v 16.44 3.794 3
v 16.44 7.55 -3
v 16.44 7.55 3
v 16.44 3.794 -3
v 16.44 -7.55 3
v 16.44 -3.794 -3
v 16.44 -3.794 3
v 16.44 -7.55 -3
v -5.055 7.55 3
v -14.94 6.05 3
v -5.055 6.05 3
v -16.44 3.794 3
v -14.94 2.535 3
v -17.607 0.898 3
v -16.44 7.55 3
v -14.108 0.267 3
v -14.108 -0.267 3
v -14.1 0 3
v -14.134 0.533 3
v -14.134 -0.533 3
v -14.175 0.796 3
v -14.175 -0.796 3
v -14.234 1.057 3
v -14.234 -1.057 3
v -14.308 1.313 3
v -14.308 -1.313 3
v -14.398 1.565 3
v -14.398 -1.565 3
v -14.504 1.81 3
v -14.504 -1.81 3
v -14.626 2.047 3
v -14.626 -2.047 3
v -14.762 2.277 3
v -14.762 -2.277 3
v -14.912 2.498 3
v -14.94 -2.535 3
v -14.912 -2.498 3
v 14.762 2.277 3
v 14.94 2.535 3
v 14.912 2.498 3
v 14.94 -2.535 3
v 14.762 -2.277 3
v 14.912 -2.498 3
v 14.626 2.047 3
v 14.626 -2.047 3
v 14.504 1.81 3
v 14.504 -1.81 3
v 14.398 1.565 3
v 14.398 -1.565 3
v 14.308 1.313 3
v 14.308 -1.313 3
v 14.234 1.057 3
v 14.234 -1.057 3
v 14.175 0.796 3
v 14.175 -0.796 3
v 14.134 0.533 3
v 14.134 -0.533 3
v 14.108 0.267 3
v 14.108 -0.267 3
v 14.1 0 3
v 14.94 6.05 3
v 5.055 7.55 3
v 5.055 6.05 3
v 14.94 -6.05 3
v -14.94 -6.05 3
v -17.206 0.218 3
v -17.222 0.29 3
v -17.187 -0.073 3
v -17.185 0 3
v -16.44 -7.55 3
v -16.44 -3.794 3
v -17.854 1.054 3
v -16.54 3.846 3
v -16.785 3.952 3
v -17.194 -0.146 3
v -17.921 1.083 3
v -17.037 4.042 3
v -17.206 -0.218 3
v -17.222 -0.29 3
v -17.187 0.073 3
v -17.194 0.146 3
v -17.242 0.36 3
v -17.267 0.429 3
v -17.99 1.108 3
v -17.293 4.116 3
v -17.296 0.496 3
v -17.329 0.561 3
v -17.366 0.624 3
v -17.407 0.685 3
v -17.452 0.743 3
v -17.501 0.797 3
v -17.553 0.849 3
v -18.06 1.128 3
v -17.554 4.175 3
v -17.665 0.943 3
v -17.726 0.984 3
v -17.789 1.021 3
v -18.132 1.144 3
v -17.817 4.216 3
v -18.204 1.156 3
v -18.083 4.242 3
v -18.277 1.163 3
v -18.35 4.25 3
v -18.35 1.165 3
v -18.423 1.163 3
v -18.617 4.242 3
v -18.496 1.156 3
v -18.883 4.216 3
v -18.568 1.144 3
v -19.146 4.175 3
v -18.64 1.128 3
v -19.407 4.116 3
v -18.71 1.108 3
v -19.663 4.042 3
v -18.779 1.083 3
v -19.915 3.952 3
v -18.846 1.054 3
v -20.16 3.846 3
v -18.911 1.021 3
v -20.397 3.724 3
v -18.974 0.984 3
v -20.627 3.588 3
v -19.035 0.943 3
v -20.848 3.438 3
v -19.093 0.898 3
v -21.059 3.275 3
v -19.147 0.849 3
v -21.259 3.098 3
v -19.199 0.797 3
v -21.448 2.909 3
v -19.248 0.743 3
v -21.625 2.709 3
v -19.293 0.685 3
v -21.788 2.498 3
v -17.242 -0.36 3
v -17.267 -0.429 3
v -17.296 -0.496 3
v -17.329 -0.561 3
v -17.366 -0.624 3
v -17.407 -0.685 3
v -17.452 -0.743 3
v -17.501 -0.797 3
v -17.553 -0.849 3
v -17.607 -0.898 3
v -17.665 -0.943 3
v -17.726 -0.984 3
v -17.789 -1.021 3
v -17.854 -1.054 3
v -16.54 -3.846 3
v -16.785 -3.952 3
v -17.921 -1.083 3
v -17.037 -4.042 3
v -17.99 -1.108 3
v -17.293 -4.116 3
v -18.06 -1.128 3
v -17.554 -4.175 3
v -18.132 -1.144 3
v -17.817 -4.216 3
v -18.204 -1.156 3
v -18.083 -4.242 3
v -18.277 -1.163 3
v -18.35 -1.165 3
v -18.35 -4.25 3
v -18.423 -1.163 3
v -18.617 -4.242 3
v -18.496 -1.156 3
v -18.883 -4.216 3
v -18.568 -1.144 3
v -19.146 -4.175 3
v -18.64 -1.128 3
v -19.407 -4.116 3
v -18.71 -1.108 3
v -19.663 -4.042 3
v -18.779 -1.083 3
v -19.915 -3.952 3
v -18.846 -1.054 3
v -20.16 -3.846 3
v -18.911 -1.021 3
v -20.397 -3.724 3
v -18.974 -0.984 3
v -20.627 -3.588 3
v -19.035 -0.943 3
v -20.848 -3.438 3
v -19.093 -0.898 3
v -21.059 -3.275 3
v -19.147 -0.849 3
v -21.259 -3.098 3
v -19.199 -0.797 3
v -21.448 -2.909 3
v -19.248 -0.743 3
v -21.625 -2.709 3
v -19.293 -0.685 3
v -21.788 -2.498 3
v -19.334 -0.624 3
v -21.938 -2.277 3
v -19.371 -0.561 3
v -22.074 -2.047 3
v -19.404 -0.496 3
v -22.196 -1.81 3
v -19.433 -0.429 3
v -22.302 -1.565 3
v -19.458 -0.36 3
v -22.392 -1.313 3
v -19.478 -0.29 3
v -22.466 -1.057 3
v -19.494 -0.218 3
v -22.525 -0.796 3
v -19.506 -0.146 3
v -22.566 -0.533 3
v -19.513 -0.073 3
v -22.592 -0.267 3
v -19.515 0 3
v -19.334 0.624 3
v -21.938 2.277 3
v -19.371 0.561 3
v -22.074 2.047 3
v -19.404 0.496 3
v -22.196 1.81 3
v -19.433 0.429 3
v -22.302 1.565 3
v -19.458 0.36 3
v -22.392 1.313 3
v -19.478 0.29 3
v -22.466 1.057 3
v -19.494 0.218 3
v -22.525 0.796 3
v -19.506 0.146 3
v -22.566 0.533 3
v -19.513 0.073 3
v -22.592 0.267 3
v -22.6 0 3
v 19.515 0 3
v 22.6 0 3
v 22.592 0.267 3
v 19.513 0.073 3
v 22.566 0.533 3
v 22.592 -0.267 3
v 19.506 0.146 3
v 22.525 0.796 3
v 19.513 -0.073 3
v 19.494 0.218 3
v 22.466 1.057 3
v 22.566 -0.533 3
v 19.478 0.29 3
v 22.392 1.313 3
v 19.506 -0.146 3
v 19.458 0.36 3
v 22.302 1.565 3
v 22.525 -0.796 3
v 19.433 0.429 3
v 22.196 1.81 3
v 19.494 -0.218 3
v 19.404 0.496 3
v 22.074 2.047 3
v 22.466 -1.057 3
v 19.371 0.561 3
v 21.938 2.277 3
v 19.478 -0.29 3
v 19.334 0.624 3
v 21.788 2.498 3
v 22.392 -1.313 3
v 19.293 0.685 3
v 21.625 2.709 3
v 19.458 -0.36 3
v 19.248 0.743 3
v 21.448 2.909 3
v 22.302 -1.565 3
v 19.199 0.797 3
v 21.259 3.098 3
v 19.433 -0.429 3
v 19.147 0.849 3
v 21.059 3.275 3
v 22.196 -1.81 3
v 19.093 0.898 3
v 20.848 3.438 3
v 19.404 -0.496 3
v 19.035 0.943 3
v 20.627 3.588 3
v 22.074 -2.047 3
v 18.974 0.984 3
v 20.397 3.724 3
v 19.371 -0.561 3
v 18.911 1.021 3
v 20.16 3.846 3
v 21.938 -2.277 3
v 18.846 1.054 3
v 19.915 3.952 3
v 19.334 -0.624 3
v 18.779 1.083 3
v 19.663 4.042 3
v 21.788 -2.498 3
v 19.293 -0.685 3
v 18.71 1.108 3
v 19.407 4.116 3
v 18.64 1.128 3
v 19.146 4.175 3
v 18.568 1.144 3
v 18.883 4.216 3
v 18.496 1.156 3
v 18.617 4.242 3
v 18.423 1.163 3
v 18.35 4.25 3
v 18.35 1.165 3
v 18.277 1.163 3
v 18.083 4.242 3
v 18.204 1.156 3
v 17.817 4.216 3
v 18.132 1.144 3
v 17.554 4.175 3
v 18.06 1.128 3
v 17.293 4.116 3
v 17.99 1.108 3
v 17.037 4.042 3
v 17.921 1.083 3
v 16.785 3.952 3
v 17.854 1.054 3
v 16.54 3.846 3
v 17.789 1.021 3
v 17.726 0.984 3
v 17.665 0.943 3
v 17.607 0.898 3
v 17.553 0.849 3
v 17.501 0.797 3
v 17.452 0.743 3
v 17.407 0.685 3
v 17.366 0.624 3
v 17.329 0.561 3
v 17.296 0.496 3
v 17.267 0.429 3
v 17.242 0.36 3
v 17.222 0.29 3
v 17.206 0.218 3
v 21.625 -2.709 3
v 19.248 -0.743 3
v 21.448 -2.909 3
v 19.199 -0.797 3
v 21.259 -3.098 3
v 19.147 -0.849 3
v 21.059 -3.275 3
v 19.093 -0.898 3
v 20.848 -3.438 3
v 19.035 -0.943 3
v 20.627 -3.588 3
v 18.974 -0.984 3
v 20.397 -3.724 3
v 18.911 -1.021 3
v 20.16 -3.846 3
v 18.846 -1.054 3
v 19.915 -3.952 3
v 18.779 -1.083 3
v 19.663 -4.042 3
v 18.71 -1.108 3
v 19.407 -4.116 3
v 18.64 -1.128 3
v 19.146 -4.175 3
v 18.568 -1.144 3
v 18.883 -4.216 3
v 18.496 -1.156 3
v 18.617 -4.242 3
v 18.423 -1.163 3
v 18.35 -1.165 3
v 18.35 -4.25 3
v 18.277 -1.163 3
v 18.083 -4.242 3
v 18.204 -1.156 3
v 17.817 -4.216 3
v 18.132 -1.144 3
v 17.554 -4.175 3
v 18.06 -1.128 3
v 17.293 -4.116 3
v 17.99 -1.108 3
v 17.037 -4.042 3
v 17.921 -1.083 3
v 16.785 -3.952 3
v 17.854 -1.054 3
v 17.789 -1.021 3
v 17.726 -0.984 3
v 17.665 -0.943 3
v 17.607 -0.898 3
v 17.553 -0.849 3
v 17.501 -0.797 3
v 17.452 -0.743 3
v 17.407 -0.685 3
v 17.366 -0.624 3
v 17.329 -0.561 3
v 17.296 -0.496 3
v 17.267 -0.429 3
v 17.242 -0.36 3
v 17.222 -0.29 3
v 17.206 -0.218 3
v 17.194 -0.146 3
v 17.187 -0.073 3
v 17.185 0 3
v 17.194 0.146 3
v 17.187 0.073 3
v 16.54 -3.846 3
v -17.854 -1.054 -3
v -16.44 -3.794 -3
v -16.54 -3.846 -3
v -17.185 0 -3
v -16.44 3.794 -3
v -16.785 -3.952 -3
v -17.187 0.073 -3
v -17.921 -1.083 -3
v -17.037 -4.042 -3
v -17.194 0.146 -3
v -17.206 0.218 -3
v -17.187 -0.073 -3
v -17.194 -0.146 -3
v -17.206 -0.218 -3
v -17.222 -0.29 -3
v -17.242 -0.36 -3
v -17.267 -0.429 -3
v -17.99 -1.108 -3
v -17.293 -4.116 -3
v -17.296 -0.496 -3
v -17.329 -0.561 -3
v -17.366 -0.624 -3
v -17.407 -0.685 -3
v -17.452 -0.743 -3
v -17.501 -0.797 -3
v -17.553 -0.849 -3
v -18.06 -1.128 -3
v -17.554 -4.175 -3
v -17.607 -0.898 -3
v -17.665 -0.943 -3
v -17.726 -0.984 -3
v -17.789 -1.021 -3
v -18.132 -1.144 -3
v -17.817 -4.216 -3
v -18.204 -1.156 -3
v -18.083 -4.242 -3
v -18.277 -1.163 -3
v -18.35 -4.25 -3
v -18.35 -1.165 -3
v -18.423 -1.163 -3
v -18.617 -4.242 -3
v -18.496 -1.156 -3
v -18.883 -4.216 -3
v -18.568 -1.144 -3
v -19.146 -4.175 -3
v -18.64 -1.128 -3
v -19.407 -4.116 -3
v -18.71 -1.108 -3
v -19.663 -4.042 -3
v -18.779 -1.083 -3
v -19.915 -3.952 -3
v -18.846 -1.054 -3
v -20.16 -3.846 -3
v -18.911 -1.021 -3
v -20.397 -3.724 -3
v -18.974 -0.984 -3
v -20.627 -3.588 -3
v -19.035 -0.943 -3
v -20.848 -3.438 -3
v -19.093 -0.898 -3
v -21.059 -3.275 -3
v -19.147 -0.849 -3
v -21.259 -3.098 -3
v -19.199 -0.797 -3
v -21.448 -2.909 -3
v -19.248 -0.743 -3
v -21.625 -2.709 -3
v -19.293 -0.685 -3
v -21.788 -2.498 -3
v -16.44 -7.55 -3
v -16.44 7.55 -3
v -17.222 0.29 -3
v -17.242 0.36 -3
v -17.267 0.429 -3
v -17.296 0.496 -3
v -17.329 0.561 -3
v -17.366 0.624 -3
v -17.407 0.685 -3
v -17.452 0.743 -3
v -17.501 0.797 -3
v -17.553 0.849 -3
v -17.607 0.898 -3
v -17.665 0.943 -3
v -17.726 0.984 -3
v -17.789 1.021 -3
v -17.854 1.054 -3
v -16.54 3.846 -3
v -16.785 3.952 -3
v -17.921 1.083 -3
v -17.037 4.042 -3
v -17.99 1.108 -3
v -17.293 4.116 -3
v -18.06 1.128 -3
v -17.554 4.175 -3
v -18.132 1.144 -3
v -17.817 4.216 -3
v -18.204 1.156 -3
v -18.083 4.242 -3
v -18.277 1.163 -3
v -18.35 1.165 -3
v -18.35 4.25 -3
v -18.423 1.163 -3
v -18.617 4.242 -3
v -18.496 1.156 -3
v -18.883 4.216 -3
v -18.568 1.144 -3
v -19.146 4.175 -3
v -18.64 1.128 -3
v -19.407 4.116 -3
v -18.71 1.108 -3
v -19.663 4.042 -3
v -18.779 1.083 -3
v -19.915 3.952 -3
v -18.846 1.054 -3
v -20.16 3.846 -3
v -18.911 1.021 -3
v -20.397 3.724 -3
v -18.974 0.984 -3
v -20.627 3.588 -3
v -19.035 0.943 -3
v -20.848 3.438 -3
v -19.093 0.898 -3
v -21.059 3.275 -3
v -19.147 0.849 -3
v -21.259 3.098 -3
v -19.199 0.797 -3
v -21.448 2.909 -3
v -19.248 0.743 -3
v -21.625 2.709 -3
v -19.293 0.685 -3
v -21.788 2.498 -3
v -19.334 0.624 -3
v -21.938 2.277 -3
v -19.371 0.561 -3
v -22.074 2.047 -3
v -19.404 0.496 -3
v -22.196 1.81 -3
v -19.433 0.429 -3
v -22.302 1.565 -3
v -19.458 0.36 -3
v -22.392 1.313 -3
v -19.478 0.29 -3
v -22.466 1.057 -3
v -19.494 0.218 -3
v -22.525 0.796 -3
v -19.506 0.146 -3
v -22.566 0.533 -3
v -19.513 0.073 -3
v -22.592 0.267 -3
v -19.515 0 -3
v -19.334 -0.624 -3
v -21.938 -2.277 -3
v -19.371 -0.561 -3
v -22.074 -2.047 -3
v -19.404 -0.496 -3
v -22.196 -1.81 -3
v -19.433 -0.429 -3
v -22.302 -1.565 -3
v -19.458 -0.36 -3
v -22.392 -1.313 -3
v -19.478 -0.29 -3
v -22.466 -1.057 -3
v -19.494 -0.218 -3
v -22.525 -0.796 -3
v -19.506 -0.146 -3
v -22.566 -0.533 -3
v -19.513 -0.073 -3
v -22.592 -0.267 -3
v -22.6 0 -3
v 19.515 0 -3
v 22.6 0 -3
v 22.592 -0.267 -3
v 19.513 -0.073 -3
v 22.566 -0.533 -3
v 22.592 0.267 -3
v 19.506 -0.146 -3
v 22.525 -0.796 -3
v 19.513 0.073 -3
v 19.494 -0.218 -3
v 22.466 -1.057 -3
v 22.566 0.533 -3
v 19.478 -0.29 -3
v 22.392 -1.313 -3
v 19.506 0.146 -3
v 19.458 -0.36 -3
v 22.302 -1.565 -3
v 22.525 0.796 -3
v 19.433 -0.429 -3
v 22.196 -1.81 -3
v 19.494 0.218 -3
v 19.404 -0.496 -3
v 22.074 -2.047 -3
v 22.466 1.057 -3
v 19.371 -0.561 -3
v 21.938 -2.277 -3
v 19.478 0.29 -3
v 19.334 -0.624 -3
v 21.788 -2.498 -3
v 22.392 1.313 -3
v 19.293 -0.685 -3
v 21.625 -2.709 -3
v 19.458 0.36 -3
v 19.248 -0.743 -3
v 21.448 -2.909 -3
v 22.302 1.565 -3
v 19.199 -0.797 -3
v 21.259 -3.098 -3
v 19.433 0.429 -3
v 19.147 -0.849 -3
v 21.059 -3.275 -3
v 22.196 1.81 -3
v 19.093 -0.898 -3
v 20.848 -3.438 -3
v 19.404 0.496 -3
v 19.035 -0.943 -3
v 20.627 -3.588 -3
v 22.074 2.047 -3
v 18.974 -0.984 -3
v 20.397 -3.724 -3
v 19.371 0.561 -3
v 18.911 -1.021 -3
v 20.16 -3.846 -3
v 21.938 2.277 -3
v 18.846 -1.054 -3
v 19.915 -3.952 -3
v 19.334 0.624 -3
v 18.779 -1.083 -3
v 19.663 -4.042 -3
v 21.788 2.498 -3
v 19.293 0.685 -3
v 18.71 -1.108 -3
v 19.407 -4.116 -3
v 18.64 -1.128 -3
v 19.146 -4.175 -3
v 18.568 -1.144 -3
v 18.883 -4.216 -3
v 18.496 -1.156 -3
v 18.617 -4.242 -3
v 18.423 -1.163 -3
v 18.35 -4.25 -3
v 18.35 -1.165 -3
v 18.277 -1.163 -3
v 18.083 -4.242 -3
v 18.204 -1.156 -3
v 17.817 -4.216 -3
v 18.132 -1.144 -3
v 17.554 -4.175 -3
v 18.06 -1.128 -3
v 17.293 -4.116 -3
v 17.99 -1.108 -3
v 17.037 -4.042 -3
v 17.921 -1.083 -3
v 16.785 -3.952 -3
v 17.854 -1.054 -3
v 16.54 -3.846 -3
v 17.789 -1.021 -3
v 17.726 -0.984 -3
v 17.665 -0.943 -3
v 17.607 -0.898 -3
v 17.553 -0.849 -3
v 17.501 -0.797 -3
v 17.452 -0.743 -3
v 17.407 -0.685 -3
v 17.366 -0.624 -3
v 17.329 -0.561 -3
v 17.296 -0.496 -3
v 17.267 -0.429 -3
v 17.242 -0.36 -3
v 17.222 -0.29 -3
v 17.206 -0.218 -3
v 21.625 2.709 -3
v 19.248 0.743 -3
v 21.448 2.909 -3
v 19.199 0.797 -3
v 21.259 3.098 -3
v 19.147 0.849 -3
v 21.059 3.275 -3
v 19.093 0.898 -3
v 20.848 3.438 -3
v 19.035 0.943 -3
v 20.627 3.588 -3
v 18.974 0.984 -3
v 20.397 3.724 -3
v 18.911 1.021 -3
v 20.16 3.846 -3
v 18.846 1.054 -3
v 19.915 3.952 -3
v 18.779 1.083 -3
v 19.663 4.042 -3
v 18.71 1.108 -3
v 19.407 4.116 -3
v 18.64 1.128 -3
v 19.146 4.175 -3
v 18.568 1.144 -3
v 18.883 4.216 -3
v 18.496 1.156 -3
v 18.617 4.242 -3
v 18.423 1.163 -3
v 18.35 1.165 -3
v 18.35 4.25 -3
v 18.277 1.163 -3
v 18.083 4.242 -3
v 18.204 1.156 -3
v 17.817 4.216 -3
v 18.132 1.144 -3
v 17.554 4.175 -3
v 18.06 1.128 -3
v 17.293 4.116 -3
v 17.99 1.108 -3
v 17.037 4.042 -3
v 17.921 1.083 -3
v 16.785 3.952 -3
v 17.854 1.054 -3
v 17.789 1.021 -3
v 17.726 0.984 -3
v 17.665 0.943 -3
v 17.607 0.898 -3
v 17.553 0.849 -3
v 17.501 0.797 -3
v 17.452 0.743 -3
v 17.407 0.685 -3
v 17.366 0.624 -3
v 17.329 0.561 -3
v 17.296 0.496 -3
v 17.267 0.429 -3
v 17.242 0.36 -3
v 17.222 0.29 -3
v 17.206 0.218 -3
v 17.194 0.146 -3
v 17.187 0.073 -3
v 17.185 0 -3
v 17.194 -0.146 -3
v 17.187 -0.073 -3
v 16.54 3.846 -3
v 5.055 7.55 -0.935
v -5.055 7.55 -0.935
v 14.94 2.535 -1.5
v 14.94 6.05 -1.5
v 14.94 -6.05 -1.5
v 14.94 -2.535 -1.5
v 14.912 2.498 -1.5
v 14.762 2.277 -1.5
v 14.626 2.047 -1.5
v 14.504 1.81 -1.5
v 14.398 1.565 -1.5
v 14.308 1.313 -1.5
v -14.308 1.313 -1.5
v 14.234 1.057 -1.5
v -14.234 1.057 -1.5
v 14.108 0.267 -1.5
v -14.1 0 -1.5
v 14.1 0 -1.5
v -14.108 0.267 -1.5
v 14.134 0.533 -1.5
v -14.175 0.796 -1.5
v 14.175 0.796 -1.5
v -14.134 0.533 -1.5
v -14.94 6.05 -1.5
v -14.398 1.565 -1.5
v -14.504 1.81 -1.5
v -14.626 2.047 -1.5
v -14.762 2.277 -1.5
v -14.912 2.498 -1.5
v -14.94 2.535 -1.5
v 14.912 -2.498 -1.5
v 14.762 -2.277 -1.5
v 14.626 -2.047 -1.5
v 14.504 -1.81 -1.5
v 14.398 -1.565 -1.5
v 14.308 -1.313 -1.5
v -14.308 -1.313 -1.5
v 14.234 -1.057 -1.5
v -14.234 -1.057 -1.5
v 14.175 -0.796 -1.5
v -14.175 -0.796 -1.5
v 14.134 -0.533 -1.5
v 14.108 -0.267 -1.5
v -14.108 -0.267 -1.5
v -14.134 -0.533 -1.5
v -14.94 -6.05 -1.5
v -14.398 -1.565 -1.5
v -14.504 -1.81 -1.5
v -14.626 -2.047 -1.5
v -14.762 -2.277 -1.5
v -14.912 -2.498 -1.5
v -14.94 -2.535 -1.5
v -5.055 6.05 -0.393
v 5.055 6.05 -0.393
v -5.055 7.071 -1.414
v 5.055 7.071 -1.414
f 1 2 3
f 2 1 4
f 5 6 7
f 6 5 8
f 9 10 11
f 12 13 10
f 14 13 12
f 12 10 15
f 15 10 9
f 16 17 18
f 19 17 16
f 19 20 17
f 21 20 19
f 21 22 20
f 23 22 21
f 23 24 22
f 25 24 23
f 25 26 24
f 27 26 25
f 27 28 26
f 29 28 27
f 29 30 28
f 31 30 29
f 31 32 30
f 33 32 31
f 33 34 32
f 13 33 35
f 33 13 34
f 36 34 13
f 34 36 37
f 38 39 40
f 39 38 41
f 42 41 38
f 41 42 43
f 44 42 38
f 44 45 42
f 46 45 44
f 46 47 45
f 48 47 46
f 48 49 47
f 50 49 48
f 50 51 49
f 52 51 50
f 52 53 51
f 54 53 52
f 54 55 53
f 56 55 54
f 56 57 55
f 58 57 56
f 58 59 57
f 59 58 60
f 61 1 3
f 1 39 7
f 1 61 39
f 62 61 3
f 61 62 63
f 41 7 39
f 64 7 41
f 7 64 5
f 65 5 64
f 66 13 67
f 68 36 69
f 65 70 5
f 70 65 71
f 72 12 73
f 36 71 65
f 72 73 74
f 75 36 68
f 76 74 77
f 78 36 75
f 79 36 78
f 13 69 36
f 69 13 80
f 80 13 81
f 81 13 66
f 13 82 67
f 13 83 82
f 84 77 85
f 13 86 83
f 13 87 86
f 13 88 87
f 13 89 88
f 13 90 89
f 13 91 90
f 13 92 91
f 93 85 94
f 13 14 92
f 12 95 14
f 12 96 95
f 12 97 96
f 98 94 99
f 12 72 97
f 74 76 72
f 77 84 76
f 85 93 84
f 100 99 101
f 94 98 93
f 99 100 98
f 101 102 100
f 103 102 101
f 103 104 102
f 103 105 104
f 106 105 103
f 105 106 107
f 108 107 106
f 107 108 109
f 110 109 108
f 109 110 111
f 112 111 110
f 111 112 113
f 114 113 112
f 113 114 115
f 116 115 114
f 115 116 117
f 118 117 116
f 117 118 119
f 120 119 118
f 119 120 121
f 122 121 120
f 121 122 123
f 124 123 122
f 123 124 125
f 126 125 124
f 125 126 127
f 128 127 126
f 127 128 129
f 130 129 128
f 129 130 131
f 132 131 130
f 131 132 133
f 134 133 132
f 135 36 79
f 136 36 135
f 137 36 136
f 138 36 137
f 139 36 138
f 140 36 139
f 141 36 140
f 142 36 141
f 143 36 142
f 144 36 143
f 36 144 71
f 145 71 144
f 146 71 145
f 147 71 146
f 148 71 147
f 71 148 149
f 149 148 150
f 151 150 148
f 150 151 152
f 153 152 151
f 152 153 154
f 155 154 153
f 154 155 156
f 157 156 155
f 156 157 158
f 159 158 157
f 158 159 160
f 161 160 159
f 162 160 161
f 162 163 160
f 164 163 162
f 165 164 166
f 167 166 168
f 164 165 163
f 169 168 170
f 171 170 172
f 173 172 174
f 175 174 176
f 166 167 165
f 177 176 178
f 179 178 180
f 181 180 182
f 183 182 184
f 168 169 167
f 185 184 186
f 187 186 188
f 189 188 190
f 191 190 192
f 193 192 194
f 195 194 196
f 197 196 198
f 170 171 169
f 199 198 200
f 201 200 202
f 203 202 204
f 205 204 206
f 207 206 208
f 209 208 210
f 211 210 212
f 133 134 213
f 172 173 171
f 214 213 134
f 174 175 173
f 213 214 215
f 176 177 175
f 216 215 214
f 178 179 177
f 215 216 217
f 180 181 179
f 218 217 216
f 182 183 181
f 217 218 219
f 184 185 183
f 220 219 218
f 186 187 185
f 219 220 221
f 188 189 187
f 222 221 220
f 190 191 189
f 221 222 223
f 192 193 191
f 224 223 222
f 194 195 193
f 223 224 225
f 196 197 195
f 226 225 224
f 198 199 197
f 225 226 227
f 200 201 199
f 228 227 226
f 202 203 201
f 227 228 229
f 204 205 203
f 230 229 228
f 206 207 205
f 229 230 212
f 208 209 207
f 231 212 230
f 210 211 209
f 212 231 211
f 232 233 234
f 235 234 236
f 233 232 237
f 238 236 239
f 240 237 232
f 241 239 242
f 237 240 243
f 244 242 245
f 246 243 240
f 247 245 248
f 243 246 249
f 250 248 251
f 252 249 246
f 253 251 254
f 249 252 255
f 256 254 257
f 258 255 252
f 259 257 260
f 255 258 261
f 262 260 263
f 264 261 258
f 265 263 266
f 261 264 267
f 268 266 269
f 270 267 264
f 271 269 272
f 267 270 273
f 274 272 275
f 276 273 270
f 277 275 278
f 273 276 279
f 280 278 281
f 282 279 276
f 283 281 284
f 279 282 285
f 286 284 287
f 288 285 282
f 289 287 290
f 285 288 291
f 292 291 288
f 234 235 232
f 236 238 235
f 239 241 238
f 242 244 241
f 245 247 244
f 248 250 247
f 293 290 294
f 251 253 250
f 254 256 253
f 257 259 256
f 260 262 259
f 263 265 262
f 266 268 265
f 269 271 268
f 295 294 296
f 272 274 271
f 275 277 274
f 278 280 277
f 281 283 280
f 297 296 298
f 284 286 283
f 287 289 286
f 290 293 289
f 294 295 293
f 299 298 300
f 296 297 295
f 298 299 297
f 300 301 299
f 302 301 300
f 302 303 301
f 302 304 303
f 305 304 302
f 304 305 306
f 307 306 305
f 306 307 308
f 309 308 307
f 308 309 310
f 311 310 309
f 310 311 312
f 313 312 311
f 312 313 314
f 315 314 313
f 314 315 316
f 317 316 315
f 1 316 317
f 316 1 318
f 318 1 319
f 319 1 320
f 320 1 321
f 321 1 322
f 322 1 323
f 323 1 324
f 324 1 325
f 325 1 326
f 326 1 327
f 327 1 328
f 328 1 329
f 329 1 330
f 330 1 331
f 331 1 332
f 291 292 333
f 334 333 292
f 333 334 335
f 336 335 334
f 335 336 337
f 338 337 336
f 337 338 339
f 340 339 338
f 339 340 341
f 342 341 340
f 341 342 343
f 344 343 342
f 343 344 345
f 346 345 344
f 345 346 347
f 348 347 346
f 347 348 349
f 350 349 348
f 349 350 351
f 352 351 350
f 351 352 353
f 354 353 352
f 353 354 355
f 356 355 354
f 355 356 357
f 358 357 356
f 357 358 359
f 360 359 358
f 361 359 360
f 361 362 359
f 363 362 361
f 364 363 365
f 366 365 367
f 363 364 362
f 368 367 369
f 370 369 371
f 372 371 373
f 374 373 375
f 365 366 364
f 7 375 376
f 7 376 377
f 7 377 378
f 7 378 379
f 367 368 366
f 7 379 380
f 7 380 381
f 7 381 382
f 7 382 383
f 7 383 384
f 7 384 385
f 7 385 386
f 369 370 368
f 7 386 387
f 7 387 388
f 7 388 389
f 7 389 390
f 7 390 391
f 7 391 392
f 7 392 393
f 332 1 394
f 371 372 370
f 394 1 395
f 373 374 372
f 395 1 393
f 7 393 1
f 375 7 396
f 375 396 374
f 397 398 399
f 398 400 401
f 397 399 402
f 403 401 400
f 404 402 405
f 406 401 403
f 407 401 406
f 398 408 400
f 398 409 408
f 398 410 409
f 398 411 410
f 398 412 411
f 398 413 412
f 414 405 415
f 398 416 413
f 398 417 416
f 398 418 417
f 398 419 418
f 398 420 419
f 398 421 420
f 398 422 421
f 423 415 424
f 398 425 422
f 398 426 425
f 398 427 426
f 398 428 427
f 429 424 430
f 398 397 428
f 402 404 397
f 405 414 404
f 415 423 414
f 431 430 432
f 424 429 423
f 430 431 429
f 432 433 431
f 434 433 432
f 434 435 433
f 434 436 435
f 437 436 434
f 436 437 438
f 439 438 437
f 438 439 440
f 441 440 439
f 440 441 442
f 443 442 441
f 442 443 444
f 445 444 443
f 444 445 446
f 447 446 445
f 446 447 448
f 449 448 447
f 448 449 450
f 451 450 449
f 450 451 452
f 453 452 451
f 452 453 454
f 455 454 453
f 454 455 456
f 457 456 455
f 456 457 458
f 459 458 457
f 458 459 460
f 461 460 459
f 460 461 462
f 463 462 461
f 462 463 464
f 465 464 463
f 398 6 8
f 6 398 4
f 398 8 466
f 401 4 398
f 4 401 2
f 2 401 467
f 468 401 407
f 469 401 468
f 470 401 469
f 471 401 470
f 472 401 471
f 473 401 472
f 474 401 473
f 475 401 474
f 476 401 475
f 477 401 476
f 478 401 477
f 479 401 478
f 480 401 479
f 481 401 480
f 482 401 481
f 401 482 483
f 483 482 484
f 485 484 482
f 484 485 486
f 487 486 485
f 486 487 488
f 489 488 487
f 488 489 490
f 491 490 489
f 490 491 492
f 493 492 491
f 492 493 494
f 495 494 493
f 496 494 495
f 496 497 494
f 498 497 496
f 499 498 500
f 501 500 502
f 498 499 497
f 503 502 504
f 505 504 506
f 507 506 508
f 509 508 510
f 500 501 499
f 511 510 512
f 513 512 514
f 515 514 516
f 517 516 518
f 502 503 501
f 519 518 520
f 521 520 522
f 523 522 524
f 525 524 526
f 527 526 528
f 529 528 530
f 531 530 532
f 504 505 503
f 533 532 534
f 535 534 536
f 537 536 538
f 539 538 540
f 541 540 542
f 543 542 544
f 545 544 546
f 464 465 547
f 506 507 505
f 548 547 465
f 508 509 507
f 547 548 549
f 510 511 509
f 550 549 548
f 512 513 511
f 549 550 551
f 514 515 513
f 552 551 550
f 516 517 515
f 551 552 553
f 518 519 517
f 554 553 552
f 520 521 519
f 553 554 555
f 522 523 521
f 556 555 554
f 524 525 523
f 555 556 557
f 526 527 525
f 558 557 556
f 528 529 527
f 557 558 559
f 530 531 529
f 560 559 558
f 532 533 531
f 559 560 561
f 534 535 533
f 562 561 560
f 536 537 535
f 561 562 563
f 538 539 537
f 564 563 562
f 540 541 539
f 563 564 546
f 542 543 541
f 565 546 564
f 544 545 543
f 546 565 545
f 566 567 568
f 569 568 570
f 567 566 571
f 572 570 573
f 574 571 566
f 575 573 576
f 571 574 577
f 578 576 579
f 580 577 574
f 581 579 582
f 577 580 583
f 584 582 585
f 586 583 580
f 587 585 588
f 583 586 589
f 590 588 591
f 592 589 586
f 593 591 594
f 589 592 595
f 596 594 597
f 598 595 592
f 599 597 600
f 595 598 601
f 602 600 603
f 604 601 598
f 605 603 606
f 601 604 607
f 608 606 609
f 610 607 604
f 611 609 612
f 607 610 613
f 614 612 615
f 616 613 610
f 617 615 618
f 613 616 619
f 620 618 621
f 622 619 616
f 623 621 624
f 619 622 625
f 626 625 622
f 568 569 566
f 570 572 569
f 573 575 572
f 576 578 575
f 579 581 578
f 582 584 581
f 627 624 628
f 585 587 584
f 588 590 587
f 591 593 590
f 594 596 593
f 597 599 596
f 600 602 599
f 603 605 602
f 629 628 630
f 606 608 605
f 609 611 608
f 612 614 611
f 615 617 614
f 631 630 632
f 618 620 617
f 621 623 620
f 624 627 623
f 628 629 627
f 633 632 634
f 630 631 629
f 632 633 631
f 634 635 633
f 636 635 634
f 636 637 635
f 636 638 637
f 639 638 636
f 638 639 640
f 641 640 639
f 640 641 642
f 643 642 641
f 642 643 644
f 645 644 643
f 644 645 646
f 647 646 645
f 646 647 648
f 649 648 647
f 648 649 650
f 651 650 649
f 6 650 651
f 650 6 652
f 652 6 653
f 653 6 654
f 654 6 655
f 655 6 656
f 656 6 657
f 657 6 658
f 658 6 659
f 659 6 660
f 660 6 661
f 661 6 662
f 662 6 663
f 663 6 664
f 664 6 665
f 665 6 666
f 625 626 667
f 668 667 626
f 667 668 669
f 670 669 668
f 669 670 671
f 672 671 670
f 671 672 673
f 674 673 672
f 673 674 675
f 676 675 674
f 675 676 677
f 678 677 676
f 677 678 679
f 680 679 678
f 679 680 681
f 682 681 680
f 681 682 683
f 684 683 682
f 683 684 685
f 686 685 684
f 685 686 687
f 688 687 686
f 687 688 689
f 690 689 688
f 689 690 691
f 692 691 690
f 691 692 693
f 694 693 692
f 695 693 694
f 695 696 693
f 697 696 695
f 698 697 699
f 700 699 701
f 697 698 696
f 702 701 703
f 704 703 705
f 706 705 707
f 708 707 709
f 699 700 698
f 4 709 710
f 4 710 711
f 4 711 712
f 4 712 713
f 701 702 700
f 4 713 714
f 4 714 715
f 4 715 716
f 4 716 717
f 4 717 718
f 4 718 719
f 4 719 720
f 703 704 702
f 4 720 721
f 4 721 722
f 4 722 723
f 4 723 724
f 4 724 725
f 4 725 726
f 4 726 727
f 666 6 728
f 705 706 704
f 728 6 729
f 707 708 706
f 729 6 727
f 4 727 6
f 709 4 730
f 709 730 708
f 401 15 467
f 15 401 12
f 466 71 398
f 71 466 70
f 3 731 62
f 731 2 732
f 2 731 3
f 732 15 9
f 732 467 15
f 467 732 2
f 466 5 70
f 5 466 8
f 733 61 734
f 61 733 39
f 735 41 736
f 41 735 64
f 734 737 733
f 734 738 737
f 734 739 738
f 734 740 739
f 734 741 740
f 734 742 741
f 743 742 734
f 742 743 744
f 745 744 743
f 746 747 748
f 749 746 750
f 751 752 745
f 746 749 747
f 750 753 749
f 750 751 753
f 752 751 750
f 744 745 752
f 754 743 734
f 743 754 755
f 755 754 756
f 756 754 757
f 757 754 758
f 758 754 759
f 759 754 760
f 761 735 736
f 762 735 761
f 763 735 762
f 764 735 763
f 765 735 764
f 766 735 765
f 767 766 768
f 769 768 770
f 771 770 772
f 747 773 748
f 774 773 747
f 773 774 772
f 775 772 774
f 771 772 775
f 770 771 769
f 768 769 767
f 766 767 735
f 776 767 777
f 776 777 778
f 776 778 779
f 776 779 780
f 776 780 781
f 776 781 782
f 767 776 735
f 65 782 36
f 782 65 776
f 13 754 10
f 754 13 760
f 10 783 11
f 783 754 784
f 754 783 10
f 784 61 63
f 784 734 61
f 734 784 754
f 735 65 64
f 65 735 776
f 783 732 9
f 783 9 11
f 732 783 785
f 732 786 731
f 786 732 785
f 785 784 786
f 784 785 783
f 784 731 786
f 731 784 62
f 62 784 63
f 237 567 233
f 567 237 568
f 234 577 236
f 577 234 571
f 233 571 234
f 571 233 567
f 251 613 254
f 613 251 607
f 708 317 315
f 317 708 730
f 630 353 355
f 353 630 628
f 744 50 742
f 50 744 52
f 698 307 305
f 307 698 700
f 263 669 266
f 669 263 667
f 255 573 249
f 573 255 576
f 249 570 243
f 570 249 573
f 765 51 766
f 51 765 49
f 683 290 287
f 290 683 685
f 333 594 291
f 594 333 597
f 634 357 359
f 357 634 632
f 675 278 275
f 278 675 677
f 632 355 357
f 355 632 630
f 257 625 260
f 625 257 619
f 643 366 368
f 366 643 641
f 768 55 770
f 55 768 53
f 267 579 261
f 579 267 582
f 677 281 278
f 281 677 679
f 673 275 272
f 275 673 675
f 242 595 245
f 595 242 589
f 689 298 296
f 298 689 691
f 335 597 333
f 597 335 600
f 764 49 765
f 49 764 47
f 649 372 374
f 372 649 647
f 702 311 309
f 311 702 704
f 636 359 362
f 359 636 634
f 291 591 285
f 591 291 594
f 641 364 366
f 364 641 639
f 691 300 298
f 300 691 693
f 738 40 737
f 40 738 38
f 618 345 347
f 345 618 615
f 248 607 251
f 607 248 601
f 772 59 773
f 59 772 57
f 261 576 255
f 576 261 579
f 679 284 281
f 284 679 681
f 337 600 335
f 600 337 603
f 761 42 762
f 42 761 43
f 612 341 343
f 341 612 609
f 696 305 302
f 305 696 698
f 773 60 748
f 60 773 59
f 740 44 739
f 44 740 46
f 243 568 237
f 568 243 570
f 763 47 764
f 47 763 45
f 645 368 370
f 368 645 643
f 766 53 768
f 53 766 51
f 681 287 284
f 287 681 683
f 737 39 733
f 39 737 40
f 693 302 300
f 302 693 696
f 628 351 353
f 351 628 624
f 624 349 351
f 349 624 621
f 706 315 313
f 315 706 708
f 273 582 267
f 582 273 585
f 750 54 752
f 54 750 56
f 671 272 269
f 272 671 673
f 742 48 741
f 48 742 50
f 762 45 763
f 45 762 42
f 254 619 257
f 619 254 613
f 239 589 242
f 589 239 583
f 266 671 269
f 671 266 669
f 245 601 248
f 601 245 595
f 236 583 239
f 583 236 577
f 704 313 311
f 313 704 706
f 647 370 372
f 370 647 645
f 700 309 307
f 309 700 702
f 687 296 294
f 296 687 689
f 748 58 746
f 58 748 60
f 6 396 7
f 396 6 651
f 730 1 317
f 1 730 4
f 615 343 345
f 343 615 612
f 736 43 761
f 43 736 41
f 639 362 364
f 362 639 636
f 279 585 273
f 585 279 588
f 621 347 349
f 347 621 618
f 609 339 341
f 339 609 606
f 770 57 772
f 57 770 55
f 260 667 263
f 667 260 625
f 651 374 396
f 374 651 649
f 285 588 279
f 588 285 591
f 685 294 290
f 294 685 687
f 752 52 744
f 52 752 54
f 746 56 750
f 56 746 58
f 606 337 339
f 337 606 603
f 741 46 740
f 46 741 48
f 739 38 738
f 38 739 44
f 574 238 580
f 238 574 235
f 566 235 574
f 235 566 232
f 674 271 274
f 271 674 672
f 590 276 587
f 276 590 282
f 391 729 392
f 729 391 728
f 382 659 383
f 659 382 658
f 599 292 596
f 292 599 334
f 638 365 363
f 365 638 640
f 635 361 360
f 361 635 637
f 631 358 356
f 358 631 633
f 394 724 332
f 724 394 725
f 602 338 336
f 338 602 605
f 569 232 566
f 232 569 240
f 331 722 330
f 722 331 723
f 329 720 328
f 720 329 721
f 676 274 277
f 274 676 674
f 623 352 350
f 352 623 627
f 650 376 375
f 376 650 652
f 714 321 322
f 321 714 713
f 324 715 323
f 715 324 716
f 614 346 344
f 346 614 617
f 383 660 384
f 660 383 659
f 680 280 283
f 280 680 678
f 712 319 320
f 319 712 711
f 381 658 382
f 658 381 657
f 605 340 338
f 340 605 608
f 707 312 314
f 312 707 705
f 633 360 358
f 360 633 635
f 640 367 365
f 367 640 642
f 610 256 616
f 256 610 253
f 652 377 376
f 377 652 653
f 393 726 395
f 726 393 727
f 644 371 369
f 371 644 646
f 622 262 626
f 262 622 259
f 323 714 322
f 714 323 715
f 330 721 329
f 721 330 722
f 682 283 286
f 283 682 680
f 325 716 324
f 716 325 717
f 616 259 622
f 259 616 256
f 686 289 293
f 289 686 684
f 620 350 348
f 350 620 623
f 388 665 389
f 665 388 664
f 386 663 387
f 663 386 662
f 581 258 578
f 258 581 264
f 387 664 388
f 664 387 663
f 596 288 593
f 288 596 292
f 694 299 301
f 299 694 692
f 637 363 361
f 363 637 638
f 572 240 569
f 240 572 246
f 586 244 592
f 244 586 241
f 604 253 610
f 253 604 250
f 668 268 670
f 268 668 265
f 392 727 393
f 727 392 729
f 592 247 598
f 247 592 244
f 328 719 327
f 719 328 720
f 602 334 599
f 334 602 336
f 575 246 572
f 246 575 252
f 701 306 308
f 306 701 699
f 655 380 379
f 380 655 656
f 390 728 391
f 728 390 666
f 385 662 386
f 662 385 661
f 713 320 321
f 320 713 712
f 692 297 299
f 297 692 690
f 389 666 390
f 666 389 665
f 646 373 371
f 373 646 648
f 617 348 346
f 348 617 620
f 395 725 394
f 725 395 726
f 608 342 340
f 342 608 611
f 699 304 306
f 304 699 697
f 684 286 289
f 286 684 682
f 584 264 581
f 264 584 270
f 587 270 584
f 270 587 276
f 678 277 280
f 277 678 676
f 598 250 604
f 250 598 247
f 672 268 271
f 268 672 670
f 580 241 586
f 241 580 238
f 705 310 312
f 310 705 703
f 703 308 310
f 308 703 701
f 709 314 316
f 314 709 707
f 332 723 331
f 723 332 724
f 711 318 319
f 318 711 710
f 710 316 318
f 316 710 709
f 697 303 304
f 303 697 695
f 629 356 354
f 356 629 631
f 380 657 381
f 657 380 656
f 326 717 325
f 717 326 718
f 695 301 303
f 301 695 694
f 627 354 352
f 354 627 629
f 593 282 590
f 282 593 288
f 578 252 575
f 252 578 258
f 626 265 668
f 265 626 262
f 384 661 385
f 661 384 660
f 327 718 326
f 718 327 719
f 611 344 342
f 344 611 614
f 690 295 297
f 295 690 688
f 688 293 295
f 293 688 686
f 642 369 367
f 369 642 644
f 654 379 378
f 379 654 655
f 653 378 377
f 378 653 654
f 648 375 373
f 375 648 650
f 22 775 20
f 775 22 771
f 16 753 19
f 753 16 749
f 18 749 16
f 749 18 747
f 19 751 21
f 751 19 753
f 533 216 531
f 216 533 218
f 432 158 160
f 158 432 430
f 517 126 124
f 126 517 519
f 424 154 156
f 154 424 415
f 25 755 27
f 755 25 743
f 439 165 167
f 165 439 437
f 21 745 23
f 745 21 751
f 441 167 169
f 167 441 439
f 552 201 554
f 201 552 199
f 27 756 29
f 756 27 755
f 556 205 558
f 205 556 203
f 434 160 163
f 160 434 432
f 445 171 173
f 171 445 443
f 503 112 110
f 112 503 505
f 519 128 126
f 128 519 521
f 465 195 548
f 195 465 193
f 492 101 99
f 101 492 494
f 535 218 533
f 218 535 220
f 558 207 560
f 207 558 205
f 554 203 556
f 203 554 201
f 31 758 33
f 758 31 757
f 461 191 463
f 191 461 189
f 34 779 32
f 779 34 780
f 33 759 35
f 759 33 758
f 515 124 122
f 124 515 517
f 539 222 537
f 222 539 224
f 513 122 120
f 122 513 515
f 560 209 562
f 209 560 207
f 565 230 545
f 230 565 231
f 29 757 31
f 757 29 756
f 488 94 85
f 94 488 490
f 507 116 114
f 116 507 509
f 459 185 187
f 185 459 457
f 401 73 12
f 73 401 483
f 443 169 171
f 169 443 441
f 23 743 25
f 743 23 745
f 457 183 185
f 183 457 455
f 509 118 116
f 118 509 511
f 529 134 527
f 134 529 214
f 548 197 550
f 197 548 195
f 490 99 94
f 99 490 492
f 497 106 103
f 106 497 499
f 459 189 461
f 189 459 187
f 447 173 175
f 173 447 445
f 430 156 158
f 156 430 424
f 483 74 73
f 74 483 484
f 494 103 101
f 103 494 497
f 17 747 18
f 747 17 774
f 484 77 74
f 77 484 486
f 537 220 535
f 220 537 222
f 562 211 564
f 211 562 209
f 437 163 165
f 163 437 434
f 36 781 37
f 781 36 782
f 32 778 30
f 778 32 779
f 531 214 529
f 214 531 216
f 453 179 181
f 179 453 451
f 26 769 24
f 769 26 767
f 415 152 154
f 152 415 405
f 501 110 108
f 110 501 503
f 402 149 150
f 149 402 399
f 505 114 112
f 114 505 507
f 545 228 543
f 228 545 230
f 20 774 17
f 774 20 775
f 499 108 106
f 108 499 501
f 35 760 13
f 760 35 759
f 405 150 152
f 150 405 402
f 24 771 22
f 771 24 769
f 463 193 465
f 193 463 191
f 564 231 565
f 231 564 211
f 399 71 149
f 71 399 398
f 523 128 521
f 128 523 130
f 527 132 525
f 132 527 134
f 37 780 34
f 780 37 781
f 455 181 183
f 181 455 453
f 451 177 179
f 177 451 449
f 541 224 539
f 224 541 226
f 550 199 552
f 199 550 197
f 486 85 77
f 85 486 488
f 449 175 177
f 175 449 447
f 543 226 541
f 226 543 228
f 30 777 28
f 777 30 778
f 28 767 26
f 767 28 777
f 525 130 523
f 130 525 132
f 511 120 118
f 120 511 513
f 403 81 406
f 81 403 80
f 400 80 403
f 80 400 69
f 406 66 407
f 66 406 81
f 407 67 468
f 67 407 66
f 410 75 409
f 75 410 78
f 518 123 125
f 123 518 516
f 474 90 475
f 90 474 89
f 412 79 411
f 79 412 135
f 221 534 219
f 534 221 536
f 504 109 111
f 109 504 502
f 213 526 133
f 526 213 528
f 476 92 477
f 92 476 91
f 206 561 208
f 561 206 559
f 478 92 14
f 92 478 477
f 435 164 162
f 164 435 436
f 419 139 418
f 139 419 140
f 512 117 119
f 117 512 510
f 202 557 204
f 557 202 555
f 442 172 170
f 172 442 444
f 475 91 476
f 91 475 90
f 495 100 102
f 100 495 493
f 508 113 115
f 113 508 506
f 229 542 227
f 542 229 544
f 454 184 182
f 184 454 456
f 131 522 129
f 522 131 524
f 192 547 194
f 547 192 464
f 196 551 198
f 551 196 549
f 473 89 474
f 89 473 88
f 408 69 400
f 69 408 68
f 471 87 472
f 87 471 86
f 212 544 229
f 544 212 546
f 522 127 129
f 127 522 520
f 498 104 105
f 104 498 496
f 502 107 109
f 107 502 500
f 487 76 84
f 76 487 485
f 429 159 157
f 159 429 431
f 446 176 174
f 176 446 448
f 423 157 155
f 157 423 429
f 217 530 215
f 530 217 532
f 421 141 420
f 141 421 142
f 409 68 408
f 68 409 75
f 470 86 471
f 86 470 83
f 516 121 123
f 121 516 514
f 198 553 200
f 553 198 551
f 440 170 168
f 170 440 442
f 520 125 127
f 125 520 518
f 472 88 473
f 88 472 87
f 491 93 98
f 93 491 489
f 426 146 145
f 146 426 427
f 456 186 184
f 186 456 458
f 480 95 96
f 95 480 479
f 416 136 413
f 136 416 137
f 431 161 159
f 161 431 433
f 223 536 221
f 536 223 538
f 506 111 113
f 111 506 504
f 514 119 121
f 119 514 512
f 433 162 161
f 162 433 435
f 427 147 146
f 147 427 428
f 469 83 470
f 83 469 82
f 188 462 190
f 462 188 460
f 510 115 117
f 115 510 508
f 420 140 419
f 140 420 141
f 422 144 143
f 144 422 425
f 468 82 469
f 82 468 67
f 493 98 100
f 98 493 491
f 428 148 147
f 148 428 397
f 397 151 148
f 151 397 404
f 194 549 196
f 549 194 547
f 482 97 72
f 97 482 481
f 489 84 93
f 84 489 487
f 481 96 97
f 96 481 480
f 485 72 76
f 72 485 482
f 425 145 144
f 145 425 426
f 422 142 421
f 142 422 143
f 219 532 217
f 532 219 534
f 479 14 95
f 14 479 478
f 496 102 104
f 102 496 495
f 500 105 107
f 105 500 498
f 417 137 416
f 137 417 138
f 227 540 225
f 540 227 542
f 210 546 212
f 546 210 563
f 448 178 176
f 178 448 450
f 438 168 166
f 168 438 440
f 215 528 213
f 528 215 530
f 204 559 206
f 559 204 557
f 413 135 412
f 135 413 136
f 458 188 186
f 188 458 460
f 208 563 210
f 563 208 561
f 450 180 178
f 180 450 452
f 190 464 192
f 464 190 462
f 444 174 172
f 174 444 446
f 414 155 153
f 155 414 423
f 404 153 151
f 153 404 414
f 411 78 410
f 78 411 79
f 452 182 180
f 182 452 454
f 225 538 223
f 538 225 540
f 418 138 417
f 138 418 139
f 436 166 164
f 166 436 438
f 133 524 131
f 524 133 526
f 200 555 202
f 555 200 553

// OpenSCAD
difference() {
  color("blue") cube( [ 32.88, 15.10, 6 ], center = true);
  color("orange") translate([0,0,2]) cube( [ 32.88 - 3, 15.10 - 3, 7 ], center = true);

  color("pink") rotate([45, 0, 0]) translate([-10.11/2, 4, -6]) cube([ 10.11, 5, 5]);
}

// color("yellow") translate([(32.88/2) + 1.91, 0, 0]) cylinder( h = 6, r = 4.25, center = true, $fn = 100 );

difference() {
  color("yellow") translate([(32.88/2) + 1.91, 0, 0]) cylinder( h = 6, r = 4.25, center = true, $fn = 100 );
  color("black") translate([(32.88/2) + 1.91, 0, 0]) cylinder( h = 8, r = 2.33/2, center = true, $fn = 100 );
}


difference() {
  color("green") translate([-(32.88/2) - 1.91, 0, 0]) cylinder( h = 6, r = 4.25, center = true, $fn = 100 );
  color("black") translate([-(32.88/2) - 1.91, 0, 0]) cylinder( h = 8, r = 2.33/2, center = true, $fn = 100 );
}

// cylinder(h = height, r1 = BottomRadius, r2 = TopRadius, center = true/false);
